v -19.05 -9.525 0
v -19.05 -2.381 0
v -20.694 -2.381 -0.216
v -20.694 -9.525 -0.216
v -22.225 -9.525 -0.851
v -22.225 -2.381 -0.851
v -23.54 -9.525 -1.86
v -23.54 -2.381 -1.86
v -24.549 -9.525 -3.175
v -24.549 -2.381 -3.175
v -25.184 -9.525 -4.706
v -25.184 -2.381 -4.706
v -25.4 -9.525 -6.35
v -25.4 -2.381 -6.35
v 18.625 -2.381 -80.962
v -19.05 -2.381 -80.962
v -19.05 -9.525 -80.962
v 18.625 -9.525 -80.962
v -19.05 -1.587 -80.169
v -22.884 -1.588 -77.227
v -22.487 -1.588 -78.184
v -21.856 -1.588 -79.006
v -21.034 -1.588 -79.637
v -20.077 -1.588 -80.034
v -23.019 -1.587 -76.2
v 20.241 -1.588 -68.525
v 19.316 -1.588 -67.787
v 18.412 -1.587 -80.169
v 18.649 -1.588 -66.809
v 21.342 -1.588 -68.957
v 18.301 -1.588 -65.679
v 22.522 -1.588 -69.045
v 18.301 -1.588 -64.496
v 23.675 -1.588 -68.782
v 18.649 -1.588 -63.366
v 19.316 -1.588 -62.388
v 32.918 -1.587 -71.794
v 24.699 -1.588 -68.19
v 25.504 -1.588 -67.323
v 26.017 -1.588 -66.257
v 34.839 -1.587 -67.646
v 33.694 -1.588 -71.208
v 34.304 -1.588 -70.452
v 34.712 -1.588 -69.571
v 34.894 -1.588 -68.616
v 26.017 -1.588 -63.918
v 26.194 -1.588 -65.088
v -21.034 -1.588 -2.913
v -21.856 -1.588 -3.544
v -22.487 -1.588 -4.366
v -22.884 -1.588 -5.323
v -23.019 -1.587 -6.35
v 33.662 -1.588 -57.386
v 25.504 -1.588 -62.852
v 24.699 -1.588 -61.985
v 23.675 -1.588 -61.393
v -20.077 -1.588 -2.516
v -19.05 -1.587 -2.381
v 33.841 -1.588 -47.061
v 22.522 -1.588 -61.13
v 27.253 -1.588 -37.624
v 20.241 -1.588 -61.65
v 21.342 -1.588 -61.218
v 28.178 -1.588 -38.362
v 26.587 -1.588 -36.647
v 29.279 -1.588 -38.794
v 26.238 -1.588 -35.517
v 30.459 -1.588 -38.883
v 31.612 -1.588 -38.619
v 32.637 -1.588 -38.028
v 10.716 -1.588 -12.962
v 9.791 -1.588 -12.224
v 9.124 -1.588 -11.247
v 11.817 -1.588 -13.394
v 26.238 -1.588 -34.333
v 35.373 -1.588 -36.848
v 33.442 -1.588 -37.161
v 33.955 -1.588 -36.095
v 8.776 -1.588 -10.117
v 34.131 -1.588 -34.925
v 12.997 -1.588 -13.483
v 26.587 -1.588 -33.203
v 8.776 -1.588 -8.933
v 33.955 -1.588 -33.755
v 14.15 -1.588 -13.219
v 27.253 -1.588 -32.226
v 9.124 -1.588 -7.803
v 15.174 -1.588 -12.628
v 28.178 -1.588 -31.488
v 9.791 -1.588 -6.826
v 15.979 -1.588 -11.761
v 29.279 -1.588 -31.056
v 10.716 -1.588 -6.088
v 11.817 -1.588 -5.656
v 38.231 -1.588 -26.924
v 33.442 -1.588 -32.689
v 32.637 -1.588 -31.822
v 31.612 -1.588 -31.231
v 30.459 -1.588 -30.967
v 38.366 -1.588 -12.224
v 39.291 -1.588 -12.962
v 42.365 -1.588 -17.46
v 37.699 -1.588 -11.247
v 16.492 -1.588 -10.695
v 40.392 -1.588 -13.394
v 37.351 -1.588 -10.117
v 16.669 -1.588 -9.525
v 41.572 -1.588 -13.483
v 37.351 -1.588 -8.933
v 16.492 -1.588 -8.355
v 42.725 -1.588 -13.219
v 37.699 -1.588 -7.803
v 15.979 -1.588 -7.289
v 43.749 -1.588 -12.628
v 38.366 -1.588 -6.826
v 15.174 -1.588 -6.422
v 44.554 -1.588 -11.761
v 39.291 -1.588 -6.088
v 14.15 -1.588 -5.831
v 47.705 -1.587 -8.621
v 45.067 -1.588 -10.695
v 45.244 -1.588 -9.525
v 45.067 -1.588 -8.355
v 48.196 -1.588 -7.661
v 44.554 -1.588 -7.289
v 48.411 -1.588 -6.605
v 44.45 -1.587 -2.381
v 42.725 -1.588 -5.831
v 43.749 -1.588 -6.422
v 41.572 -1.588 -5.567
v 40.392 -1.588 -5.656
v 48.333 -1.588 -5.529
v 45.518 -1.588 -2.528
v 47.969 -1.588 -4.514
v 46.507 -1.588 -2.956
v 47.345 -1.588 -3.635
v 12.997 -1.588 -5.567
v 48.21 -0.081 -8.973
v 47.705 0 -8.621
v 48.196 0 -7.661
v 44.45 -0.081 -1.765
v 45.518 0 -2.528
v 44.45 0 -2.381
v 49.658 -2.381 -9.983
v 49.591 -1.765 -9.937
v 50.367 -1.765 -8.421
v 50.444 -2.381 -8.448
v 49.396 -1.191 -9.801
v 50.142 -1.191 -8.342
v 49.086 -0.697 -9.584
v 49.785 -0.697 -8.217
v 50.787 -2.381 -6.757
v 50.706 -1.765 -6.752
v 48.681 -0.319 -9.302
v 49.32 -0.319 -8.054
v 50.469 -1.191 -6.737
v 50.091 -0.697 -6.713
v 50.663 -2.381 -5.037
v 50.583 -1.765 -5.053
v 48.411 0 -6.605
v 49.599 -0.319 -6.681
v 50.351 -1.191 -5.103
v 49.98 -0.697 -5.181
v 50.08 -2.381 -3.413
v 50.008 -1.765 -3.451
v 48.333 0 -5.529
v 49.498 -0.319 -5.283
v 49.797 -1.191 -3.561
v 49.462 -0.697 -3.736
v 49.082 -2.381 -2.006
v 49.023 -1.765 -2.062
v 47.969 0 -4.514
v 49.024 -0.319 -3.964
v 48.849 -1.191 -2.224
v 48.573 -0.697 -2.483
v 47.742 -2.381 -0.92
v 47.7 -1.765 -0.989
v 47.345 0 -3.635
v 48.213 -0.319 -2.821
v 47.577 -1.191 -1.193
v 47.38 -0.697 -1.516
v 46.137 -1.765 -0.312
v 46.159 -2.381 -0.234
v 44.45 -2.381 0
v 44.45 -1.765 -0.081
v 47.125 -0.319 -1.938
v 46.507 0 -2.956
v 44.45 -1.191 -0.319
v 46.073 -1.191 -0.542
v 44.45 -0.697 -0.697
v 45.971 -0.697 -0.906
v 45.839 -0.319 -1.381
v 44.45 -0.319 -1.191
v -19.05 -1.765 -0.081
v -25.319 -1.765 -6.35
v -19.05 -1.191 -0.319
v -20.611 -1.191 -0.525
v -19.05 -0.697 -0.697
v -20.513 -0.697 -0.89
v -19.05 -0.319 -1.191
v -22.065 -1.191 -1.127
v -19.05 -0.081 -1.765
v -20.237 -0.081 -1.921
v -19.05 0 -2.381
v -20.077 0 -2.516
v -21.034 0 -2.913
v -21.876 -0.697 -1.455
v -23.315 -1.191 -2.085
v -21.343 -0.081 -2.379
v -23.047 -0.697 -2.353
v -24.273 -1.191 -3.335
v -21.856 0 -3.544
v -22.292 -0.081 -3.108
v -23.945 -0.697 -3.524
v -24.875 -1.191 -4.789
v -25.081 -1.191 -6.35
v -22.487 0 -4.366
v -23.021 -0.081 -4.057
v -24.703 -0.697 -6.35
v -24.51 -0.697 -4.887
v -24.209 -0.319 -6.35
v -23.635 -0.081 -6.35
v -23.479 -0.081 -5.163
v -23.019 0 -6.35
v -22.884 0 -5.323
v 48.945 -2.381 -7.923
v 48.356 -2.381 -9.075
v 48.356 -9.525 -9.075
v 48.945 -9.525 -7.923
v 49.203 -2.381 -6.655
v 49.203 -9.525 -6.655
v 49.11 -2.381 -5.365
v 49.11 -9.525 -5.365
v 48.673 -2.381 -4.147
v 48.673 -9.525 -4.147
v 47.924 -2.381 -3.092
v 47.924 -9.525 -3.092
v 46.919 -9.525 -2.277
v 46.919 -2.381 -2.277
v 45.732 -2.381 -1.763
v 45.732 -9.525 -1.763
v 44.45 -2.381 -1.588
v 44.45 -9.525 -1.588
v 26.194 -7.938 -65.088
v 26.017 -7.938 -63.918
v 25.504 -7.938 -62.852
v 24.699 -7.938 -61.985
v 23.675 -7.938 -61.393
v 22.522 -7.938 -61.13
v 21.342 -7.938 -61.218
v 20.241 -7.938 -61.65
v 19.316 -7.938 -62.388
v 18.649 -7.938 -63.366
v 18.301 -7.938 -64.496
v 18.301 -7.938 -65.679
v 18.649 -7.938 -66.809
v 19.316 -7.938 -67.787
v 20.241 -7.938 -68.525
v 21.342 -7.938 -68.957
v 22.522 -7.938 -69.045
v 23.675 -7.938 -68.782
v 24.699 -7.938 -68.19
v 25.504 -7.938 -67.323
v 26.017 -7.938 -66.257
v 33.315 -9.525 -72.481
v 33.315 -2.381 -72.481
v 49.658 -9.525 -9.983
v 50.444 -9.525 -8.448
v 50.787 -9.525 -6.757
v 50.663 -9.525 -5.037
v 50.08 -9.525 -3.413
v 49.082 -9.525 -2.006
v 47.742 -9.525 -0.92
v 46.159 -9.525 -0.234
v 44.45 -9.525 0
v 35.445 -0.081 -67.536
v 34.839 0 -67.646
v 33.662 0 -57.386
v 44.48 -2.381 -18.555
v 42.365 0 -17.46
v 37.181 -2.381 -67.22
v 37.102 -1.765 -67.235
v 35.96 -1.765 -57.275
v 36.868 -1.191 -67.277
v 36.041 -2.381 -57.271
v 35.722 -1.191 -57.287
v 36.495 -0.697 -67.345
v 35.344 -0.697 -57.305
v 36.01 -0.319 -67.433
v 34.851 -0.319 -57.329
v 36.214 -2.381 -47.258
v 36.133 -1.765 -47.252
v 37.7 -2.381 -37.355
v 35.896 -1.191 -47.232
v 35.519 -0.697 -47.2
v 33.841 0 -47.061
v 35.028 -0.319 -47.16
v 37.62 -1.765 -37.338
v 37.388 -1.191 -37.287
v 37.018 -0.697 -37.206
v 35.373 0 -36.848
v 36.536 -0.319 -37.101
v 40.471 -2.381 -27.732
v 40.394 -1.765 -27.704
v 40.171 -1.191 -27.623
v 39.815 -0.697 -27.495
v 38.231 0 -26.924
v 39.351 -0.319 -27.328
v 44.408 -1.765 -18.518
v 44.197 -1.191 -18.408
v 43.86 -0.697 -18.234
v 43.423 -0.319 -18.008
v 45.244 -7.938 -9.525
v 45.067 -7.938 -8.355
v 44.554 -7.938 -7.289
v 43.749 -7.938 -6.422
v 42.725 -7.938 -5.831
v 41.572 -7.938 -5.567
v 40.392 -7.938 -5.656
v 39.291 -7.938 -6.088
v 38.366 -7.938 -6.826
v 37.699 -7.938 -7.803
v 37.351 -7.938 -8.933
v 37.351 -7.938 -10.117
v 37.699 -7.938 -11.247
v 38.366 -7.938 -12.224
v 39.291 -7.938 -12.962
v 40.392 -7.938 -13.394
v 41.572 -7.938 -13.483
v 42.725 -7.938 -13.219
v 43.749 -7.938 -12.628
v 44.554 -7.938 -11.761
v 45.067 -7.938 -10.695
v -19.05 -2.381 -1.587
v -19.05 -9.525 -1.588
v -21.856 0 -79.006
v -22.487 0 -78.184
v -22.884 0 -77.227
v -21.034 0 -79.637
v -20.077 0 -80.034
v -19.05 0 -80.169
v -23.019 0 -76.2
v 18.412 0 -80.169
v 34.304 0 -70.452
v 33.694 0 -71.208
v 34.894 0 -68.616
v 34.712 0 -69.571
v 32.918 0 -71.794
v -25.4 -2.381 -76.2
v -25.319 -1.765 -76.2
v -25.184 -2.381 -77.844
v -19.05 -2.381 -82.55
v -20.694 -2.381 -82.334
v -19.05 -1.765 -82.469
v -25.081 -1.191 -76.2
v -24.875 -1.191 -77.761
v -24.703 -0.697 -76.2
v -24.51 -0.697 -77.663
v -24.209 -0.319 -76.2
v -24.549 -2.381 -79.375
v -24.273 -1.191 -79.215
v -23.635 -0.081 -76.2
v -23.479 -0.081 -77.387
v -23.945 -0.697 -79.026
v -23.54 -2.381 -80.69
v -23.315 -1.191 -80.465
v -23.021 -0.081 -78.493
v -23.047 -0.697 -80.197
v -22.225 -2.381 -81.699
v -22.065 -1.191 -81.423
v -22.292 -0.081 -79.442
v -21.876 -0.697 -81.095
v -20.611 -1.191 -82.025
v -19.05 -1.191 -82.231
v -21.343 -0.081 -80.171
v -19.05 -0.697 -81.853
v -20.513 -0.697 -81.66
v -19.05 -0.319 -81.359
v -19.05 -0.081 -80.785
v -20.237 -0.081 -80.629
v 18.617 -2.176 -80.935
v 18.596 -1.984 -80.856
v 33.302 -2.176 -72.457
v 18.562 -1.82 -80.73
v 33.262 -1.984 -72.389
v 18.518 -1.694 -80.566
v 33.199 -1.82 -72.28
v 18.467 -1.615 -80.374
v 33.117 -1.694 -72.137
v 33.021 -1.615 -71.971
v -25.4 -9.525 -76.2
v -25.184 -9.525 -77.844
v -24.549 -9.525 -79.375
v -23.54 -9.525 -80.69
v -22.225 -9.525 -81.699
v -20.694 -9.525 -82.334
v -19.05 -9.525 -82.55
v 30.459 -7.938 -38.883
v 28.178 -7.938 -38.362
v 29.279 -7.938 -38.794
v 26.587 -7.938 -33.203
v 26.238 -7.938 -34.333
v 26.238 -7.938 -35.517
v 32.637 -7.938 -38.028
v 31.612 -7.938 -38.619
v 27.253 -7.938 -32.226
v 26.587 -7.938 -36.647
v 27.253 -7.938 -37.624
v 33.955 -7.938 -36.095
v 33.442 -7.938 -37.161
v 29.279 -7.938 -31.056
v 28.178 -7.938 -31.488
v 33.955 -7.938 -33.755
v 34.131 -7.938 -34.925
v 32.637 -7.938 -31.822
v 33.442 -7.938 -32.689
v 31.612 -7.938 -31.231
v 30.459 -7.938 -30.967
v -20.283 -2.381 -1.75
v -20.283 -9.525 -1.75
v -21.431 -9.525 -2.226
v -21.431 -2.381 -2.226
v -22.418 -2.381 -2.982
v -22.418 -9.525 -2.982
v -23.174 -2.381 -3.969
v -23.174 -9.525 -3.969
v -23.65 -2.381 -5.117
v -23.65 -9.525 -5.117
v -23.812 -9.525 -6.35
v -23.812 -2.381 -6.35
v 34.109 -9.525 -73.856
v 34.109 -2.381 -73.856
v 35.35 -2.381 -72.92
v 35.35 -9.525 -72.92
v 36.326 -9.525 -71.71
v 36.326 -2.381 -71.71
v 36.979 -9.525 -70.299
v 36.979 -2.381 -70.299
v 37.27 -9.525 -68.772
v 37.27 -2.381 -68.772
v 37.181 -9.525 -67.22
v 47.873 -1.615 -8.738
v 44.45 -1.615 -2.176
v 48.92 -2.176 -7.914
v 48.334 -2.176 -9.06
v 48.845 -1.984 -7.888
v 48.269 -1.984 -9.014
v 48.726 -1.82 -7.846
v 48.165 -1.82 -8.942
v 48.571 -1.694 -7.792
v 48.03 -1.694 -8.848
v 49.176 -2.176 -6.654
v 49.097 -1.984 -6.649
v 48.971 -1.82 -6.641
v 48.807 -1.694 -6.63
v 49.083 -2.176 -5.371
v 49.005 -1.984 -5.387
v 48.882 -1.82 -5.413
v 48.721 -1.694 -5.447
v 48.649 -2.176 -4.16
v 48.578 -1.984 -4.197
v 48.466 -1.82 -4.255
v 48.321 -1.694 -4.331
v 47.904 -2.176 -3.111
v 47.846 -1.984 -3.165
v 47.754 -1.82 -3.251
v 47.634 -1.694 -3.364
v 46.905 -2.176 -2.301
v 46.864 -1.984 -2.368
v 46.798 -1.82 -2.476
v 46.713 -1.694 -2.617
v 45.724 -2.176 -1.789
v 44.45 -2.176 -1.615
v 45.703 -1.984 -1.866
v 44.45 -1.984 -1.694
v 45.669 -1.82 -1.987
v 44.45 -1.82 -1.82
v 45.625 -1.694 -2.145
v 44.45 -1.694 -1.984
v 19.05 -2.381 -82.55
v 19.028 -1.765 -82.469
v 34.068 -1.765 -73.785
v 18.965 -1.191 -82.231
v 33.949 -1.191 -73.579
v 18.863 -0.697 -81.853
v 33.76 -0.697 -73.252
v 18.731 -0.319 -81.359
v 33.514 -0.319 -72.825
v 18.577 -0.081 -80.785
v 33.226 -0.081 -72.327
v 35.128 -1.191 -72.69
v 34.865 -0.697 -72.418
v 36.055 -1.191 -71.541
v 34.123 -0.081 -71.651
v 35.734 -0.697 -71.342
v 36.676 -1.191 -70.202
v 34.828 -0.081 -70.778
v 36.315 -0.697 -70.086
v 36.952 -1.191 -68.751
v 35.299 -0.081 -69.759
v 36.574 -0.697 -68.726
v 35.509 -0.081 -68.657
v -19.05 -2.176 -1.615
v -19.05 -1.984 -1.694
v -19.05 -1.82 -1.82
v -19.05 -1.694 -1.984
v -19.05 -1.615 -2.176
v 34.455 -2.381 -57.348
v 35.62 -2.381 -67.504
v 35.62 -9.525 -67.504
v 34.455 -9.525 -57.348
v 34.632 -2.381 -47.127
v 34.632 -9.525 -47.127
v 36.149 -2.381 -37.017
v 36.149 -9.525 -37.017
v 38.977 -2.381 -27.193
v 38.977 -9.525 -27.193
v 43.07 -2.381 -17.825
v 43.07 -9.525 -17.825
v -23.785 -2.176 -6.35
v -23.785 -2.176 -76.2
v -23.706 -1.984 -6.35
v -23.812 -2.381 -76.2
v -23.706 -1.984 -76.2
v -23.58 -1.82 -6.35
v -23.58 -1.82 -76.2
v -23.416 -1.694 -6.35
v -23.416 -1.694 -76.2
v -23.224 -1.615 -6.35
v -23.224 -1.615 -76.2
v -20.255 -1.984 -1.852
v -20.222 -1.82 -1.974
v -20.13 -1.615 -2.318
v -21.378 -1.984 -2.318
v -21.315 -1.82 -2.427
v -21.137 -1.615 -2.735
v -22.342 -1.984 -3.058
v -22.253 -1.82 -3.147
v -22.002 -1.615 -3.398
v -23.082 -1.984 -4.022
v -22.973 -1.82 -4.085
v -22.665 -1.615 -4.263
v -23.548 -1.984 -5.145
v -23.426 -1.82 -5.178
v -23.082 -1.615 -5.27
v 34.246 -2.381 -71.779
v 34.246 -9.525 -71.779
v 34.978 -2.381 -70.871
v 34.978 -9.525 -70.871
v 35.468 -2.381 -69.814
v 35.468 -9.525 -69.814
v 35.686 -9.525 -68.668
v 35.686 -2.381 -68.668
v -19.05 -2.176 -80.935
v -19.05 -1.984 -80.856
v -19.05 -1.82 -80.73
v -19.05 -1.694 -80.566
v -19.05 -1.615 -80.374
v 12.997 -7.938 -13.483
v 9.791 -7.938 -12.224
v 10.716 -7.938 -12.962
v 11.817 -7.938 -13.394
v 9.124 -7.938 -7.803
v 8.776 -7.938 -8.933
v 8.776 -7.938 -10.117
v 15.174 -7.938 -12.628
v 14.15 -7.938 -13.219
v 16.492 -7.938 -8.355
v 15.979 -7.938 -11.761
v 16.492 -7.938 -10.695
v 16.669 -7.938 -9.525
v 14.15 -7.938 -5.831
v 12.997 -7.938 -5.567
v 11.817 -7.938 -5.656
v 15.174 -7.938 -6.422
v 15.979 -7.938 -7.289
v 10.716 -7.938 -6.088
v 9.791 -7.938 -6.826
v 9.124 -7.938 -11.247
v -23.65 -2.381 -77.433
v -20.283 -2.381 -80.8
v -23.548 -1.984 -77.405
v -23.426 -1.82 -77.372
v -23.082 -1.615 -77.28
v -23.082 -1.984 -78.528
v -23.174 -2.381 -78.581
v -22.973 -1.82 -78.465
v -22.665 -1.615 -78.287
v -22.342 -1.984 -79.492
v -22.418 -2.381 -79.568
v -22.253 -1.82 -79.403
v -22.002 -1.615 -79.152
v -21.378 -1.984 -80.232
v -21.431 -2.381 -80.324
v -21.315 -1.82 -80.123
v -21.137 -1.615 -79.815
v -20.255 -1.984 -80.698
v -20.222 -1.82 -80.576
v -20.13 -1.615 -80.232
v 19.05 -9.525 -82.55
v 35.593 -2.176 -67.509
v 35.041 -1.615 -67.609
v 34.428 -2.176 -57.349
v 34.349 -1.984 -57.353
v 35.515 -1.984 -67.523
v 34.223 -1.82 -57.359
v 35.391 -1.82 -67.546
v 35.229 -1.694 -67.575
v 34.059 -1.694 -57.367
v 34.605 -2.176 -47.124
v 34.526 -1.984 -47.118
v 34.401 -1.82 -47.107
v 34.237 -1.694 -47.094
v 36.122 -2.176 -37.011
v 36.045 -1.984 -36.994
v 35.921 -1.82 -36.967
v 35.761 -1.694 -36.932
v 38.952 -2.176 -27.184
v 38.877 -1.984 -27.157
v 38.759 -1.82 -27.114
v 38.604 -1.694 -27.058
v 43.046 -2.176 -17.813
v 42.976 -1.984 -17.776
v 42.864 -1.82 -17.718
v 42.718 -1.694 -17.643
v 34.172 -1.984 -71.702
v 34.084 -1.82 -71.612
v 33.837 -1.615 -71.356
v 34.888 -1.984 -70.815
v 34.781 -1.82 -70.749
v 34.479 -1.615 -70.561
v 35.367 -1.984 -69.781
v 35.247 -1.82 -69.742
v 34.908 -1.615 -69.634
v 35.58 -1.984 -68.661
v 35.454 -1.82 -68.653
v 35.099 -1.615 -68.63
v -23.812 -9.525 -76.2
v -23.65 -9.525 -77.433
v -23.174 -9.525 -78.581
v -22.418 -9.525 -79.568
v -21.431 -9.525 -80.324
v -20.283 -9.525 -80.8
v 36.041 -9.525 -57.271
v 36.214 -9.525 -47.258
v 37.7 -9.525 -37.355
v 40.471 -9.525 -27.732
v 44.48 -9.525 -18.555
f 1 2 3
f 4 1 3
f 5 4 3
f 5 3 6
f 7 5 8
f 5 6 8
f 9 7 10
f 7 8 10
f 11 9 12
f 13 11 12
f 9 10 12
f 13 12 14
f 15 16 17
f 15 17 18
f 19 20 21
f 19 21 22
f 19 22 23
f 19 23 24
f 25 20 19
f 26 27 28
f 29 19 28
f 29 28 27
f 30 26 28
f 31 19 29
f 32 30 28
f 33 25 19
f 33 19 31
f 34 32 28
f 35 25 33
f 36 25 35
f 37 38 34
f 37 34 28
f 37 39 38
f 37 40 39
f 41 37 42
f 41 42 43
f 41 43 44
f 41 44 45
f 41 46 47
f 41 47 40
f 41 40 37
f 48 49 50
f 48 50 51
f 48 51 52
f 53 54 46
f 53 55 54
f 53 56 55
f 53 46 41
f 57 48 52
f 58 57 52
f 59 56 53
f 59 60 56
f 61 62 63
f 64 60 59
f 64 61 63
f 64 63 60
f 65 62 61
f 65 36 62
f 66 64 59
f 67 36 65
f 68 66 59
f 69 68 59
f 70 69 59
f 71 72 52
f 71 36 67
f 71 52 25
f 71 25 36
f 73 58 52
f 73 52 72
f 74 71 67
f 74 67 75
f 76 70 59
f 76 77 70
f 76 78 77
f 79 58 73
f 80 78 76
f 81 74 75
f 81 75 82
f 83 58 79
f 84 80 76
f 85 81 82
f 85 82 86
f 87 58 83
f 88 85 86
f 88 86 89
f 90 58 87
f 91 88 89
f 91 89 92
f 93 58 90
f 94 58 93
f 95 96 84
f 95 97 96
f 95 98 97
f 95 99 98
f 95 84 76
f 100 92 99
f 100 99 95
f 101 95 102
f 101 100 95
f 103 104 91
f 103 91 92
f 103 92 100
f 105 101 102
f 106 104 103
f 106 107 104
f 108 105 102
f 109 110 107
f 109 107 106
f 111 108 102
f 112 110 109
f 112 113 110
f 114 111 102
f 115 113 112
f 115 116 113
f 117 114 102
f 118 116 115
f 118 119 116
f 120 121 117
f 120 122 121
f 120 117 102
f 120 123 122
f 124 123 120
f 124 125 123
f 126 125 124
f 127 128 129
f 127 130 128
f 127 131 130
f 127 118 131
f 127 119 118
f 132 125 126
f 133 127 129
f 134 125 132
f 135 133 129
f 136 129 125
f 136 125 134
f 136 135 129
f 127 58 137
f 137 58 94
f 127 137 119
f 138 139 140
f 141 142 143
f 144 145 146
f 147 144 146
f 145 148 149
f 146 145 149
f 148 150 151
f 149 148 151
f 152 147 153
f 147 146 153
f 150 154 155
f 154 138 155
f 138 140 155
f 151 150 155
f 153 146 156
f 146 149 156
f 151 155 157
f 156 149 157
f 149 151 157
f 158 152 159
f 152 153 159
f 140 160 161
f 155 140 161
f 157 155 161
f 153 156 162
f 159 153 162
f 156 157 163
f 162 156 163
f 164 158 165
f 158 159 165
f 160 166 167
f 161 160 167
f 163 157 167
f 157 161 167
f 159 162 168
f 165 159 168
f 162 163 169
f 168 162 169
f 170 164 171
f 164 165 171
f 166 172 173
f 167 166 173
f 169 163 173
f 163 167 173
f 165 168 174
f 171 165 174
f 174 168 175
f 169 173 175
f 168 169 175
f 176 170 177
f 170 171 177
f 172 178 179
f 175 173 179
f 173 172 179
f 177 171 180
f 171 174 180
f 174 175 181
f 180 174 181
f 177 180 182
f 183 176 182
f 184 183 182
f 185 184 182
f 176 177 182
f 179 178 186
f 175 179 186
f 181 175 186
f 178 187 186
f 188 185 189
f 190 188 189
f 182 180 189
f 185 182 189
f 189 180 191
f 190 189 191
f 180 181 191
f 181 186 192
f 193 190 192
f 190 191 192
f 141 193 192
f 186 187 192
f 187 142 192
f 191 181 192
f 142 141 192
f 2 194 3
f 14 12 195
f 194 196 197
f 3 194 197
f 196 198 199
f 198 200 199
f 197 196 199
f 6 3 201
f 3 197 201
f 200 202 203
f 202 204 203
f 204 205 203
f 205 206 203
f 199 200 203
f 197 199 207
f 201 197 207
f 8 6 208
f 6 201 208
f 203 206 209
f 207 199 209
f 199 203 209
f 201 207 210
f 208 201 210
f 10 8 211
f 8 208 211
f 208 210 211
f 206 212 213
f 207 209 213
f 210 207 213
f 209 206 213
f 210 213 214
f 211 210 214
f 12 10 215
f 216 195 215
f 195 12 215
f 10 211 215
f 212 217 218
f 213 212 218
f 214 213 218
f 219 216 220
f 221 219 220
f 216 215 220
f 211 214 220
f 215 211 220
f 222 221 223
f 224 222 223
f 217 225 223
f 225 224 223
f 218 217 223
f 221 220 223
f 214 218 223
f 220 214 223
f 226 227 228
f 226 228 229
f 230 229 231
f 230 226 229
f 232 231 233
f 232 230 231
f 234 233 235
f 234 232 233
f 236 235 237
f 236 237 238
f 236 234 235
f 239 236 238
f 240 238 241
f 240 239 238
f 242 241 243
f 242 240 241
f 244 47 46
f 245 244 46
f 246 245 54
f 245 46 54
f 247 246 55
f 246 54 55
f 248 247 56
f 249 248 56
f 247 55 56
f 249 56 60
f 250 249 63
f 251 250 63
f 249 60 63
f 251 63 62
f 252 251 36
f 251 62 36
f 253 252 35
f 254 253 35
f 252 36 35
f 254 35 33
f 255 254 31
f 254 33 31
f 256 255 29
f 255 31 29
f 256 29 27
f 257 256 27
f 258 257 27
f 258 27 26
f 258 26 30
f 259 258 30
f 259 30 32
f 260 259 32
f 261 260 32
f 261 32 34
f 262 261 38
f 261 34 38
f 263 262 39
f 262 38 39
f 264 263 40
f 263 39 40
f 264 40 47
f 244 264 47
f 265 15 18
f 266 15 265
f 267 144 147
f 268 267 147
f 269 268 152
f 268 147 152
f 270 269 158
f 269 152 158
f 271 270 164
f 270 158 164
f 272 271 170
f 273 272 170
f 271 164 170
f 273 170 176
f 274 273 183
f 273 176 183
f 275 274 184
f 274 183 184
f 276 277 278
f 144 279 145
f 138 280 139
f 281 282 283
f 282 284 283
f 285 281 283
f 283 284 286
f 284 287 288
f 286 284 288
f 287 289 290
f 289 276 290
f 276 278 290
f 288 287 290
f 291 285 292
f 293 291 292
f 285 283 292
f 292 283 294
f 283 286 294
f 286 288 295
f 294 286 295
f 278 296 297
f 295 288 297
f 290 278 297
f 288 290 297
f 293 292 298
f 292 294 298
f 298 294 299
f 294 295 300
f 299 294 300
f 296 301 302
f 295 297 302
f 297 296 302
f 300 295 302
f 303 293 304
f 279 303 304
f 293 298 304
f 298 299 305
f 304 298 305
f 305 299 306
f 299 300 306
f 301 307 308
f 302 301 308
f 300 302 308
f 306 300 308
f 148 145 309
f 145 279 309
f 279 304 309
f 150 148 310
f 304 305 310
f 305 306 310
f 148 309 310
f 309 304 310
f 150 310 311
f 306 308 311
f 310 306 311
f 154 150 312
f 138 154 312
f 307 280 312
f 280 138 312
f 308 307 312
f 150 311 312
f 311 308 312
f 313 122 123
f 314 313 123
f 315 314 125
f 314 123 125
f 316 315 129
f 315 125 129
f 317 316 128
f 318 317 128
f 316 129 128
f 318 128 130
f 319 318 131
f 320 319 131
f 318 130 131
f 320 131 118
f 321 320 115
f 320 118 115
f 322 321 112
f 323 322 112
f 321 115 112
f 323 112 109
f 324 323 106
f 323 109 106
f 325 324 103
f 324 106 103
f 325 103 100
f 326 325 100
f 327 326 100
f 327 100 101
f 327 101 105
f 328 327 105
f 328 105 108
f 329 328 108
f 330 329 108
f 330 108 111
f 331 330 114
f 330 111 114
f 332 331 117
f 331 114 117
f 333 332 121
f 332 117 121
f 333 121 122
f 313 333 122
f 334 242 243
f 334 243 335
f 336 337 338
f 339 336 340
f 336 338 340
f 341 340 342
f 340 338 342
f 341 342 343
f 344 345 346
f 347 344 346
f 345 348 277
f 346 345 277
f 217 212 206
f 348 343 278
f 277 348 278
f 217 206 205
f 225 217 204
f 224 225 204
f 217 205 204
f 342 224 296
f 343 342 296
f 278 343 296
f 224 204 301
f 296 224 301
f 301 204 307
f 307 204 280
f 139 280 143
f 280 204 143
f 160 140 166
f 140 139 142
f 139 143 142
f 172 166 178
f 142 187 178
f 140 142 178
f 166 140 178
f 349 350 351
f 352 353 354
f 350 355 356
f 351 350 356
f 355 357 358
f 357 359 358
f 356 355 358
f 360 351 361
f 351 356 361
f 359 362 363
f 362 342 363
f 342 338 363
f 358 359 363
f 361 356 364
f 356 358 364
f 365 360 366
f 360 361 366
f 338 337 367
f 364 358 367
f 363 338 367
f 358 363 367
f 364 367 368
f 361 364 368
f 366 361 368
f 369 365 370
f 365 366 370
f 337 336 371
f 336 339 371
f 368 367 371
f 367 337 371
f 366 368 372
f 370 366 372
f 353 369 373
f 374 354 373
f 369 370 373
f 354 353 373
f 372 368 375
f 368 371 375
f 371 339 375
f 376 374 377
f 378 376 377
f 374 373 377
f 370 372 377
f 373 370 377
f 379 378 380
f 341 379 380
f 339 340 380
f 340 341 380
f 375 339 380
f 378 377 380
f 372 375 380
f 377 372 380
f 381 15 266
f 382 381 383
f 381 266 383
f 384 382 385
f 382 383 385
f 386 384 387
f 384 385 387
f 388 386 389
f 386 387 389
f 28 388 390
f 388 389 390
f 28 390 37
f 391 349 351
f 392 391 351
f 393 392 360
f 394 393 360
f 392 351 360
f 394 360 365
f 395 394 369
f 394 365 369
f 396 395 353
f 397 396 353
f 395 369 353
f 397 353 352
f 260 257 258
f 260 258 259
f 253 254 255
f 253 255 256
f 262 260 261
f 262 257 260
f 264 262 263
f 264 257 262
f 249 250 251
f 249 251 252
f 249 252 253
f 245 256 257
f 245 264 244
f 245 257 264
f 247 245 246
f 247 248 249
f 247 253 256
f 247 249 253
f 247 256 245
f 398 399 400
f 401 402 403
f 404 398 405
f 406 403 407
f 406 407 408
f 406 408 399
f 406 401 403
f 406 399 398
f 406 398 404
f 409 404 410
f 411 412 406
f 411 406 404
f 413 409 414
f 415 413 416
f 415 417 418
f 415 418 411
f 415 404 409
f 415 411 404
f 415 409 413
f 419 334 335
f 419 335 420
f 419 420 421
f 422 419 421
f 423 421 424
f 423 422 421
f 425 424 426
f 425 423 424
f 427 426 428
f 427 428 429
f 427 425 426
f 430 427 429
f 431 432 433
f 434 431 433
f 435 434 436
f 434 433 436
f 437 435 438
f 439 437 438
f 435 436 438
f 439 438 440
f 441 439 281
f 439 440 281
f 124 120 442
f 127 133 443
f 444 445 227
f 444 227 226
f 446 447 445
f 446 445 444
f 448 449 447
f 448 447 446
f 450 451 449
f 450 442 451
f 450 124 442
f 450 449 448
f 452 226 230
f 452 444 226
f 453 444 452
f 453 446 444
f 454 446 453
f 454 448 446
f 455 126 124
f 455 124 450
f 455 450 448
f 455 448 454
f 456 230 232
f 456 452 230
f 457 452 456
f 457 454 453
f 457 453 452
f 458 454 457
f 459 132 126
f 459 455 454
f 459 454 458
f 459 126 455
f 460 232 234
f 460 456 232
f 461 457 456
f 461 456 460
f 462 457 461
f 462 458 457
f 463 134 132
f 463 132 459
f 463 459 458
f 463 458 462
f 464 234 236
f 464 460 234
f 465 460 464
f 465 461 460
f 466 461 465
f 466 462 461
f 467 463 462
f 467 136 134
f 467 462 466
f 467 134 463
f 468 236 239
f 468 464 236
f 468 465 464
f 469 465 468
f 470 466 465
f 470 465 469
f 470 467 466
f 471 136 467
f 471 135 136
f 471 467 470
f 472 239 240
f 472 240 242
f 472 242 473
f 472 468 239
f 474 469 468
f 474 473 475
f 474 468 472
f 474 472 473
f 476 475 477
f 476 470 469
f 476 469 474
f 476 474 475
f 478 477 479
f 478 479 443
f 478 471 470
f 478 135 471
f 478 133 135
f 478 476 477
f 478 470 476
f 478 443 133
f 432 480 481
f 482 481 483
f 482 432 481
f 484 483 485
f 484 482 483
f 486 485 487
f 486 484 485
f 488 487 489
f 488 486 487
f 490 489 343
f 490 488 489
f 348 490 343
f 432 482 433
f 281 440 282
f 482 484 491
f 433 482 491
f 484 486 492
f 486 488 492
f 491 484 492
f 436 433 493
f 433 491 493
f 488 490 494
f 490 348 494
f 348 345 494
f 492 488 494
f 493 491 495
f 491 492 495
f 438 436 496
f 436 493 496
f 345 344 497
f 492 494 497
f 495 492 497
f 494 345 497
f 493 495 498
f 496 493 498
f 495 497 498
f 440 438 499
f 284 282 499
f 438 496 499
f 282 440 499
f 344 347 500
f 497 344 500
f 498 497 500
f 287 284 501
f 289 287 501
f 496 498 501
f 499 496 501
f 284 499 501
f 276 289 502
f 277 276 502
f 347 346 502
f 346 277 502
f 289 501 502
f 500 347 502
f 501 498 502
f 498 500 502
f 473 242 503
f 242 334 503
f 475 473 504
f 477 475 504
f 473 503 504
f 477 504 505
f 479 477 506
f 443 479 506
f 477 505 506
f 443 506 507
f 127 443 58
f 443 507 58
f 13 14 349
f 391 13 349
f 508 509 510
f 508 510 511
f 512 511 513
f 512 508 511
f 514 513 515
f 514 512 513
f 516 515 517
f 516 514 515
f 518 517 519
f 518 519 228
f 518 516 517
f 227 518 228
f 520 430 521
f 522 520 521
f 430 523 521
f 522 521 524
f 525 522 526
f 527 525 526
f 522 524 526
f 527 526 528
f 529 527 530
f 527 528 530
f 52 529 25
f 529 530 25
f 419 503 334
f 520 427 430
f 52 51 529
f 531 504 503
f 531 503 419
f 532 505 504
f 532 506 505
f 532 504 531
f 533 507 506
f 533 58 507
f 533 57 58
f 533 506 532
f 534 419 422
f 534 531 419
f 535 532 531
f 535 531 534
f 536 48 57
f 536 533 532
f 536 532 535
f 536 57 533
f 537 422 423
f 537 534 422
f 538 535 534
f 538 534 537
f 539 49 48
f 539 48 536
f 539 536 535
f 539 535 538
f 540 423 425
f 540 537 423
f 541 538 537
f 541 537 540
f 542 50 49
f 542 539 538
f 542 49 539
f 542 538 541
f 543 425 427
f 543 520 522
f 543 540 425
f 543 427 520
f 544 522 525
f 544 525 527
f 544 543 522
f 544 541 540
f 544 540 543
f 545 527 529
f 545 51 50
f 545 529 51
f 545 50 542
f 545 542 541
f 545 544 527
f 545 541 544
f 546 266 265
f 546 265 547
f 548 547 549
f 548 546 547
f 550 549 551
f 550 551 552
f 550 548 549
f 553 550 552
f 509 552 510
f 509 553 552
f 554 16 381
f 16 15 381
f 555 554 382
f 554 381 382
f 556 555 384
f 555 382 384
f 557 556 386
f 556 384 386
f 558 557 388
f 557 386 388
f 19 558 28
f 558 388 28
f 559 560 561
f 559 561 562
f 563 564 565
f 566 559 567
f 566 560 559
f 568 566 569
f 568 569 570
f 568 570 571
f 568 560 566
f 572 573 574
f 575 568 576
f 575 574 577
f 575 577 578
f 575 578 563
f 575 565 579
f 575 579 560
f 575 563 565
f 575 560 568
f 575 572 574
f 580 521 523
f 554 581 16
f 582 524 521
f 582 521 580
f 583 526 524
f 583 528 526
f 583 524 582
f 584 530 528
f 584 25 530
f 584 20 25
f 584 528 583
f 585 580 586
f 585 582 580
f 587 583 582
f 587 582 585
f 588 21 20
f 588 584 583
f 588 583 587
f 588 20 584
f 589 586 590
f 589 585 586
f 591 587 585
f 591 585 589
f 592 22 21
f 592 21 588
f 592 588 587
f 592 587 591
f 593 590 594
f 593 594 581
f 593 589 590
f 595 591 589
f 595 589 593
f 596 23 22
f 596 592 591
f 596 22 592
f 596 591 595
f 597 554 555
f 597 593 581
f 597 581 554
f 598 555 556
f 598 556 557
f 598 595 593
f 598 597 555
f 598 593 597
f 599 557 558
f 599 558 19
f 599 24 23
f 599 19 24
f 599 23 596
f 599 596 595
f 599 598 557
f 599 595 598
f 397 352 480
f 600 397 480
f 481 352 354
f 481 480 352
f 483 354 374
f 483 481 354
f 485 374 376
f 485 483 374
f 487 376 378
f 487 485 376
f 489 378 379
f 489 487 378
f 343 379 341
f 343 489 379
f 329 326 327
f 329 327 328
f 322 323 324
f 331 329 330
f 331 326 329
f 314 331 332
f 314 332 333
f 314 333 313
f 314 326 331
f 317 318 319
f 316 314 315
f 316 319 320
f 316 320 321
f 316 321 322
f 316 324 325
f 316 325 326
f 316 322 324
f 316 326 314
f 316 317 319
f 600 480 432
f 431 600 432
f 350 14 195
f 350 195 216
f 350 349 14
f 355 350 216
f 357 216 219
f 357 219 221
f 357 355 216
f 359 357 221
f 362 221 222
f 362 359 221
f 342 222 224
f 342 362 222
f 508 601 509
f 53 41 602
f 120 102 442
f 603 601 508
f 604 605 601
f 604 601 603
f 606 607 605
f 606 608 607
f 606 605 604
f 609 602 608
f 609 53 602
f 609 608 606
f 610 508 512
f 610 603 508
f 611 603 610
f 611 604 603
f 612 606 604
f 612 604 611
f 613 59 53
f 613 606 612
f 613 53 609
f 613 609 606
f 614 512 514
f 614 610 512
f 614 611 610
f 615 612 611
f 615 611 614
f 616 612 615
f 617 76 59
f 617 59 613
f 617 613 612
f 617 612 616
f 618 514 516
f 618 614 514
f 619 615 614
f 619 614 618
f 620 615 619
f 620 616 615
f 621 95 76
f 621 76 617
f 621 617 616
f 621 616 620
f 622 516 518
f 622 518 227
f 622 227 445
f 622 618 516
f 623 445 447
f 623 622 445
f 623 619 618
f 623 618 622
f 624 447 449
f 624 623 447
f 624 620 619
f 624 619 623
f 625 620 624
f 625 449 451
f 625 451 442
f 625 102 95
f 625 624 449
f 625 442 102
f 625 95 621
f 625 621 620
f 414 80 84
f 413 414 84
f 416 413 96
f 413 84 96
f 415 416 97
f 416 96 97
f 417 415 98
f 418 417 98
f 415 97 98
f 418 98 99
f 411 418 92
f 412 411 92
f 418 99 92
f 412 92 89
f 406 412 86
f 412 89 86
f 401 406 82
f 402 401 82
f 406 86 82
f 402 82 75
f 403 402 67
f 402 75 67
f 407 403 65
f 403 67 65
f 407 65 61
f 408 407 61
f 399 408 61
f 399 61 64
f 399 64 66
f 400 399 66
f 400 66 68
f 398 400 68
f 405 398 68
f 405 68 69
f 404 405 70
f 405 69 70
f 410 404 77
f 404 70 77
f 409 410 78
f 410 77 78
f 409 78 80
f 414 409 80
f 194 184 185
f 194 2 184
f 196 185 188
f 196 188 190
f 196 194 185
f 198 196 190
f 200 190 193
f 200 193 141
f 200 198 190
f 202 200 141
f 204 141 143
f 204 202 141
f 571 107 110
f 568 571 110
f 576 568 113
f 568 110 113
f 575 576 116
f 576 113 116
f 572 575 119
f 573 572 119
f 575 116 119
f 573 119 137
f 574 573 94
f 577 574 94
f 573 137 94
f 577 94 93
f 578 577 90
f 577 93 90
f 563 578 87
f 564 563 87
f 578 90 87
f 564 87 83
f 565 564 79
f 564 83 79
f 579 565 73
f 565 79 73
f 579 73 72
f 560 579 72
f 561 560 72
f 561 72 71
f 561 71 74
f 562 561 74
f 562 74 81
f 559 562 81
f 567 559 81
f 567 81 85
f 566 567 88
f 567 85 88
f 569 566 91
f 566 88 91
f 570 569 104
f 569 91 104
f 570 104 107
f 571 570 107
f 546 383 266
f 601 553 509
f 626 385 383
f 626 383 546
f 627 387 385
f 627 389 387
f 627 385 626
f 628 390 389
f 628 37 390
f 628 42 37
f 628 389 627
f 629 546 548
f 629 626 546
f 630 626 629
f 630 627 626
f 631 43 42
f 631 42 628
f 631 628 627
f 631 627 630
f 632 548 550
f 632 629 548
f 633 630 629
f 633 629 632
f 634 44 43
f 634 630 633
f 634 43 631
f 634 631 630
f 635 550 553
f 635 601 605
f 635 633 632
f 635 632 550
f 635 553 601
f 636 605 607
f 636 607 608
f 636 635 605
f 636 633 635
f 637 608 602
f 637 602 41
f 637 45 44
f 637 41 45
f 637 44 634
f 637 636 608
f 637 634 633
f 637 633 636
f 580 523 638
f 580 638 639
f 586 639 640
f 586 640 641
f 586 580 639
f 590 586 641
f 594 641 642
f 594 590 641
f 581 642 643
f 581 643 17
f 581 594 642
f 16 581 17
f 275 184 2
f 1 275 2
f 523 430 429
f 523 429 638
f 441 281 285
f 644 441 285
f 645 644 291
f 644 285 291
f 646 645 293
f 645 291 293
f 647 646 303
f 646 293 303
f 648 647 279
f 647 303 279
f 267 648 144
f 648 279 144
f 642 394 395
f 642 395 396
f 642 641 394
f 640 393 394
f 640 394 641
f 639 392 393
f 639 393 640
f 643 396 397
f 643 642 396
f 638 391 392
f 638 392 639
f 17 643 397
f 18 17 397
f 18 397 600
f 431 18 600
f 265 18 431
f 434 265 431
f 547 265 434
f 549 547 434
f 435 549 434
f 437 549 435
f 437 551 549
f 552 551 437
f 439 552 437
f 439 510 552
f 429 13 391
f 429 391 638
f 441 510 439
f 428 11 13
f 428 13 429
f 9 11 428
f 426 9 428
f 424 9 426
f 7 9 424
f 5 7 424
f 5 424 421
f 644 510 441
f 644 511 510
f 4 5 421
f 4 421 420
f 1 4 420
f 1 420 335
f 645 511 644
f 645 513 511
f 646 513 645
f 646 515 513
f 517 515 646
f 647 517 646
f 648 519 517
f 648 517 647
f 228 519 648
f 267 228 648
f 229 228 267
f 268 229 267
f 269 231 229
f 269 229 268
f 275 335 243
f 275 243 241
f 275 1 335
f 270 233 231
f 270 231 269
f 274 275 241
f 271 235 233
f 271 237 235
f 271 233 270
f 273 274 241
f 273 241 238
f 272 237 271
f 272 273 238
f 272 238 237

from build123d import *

# Parameters (mm, degrees)
F1_DEPTH = 9.525
F2_T     = -1.5875
F3_R     = 3.96875
F4_DEPTH = 6.35
F5_R     = 0.79375
F6_R     = 2.38125


with BuildPart() as f1:
    # F0 (on Front) → F1 (new body)
    with BuildSketch(Plane.XZ):
        with BuildLine():
            Line((44.45, 0), (-19.05, 0))
            ThreePointArc((-19.05, 0), (-23.5401280605, -1.8598719395), (-25.4, -6.35))
            Line((-25.4, -6.35), (-25.4, -76.2))
            ThreePointArc((-25.4, -76.2), (-23.5401280605, -80.6901280605), (-19.05, -82.55))
            Line((-19.05, -82.55), (19.05, -82.55))
            Line((19.05, -82.55), (34.1089205608, -73.8557281605))
            ThreePointArc((34.1089205608, -73.8557281605), (36.6961873461, -71.0245713224), (37.1814148685, -67.2201064833))
            ThreePointArc((37.1814148685, -67.2201064833), (37.6995950161, -37.3548976318), (49.6577958893, -9.9833678558))
            ThreePointArc((49.6577958893, -9.9833678558), (50.0800260161, -3.4131126923), (44.45, 0))
        make_face()
    extrude(amount=F1_DEPTH)

    # F2
    f2_openings = [f1.faces().sort_by_distance(p)[0] for p in [
        (7.276457, -9.525, -39.048077),
    ]]
    offset(amount=F2_T, openings=f2_openings)

    # F3 (on face) → F4 (join)
    with BuildSketch(Plane.XZ.offset(1.5875)):
        with Locations((41.275, -9.525)):
            Circle(F3_R)
        with Locations((12.7, -9.525)):
            Circle(F3_R)
        with Locations((30.1625, -34.925)):
            Circle(F3_R)
        with Locations((22.225, -65.0875)):
            Circle(F3_R)
    extrude(amount=F4_DEPTH)

    # F5
    f5_edges = [f1.edges().sort_by_distance(p)[0] for p in [
        (-23.8125, -1.5875, -41.275),
    ]]
    fillet(f5_edges, radius=F5_R)

    # F6
    f6_edges = [f1.edges().sort_by_distance(p)[0] for p in [
        (37.699595, 0, -37.354898),
    ]]
    fillet(f6_edges, radius=F6_R)


solid = f1.part
